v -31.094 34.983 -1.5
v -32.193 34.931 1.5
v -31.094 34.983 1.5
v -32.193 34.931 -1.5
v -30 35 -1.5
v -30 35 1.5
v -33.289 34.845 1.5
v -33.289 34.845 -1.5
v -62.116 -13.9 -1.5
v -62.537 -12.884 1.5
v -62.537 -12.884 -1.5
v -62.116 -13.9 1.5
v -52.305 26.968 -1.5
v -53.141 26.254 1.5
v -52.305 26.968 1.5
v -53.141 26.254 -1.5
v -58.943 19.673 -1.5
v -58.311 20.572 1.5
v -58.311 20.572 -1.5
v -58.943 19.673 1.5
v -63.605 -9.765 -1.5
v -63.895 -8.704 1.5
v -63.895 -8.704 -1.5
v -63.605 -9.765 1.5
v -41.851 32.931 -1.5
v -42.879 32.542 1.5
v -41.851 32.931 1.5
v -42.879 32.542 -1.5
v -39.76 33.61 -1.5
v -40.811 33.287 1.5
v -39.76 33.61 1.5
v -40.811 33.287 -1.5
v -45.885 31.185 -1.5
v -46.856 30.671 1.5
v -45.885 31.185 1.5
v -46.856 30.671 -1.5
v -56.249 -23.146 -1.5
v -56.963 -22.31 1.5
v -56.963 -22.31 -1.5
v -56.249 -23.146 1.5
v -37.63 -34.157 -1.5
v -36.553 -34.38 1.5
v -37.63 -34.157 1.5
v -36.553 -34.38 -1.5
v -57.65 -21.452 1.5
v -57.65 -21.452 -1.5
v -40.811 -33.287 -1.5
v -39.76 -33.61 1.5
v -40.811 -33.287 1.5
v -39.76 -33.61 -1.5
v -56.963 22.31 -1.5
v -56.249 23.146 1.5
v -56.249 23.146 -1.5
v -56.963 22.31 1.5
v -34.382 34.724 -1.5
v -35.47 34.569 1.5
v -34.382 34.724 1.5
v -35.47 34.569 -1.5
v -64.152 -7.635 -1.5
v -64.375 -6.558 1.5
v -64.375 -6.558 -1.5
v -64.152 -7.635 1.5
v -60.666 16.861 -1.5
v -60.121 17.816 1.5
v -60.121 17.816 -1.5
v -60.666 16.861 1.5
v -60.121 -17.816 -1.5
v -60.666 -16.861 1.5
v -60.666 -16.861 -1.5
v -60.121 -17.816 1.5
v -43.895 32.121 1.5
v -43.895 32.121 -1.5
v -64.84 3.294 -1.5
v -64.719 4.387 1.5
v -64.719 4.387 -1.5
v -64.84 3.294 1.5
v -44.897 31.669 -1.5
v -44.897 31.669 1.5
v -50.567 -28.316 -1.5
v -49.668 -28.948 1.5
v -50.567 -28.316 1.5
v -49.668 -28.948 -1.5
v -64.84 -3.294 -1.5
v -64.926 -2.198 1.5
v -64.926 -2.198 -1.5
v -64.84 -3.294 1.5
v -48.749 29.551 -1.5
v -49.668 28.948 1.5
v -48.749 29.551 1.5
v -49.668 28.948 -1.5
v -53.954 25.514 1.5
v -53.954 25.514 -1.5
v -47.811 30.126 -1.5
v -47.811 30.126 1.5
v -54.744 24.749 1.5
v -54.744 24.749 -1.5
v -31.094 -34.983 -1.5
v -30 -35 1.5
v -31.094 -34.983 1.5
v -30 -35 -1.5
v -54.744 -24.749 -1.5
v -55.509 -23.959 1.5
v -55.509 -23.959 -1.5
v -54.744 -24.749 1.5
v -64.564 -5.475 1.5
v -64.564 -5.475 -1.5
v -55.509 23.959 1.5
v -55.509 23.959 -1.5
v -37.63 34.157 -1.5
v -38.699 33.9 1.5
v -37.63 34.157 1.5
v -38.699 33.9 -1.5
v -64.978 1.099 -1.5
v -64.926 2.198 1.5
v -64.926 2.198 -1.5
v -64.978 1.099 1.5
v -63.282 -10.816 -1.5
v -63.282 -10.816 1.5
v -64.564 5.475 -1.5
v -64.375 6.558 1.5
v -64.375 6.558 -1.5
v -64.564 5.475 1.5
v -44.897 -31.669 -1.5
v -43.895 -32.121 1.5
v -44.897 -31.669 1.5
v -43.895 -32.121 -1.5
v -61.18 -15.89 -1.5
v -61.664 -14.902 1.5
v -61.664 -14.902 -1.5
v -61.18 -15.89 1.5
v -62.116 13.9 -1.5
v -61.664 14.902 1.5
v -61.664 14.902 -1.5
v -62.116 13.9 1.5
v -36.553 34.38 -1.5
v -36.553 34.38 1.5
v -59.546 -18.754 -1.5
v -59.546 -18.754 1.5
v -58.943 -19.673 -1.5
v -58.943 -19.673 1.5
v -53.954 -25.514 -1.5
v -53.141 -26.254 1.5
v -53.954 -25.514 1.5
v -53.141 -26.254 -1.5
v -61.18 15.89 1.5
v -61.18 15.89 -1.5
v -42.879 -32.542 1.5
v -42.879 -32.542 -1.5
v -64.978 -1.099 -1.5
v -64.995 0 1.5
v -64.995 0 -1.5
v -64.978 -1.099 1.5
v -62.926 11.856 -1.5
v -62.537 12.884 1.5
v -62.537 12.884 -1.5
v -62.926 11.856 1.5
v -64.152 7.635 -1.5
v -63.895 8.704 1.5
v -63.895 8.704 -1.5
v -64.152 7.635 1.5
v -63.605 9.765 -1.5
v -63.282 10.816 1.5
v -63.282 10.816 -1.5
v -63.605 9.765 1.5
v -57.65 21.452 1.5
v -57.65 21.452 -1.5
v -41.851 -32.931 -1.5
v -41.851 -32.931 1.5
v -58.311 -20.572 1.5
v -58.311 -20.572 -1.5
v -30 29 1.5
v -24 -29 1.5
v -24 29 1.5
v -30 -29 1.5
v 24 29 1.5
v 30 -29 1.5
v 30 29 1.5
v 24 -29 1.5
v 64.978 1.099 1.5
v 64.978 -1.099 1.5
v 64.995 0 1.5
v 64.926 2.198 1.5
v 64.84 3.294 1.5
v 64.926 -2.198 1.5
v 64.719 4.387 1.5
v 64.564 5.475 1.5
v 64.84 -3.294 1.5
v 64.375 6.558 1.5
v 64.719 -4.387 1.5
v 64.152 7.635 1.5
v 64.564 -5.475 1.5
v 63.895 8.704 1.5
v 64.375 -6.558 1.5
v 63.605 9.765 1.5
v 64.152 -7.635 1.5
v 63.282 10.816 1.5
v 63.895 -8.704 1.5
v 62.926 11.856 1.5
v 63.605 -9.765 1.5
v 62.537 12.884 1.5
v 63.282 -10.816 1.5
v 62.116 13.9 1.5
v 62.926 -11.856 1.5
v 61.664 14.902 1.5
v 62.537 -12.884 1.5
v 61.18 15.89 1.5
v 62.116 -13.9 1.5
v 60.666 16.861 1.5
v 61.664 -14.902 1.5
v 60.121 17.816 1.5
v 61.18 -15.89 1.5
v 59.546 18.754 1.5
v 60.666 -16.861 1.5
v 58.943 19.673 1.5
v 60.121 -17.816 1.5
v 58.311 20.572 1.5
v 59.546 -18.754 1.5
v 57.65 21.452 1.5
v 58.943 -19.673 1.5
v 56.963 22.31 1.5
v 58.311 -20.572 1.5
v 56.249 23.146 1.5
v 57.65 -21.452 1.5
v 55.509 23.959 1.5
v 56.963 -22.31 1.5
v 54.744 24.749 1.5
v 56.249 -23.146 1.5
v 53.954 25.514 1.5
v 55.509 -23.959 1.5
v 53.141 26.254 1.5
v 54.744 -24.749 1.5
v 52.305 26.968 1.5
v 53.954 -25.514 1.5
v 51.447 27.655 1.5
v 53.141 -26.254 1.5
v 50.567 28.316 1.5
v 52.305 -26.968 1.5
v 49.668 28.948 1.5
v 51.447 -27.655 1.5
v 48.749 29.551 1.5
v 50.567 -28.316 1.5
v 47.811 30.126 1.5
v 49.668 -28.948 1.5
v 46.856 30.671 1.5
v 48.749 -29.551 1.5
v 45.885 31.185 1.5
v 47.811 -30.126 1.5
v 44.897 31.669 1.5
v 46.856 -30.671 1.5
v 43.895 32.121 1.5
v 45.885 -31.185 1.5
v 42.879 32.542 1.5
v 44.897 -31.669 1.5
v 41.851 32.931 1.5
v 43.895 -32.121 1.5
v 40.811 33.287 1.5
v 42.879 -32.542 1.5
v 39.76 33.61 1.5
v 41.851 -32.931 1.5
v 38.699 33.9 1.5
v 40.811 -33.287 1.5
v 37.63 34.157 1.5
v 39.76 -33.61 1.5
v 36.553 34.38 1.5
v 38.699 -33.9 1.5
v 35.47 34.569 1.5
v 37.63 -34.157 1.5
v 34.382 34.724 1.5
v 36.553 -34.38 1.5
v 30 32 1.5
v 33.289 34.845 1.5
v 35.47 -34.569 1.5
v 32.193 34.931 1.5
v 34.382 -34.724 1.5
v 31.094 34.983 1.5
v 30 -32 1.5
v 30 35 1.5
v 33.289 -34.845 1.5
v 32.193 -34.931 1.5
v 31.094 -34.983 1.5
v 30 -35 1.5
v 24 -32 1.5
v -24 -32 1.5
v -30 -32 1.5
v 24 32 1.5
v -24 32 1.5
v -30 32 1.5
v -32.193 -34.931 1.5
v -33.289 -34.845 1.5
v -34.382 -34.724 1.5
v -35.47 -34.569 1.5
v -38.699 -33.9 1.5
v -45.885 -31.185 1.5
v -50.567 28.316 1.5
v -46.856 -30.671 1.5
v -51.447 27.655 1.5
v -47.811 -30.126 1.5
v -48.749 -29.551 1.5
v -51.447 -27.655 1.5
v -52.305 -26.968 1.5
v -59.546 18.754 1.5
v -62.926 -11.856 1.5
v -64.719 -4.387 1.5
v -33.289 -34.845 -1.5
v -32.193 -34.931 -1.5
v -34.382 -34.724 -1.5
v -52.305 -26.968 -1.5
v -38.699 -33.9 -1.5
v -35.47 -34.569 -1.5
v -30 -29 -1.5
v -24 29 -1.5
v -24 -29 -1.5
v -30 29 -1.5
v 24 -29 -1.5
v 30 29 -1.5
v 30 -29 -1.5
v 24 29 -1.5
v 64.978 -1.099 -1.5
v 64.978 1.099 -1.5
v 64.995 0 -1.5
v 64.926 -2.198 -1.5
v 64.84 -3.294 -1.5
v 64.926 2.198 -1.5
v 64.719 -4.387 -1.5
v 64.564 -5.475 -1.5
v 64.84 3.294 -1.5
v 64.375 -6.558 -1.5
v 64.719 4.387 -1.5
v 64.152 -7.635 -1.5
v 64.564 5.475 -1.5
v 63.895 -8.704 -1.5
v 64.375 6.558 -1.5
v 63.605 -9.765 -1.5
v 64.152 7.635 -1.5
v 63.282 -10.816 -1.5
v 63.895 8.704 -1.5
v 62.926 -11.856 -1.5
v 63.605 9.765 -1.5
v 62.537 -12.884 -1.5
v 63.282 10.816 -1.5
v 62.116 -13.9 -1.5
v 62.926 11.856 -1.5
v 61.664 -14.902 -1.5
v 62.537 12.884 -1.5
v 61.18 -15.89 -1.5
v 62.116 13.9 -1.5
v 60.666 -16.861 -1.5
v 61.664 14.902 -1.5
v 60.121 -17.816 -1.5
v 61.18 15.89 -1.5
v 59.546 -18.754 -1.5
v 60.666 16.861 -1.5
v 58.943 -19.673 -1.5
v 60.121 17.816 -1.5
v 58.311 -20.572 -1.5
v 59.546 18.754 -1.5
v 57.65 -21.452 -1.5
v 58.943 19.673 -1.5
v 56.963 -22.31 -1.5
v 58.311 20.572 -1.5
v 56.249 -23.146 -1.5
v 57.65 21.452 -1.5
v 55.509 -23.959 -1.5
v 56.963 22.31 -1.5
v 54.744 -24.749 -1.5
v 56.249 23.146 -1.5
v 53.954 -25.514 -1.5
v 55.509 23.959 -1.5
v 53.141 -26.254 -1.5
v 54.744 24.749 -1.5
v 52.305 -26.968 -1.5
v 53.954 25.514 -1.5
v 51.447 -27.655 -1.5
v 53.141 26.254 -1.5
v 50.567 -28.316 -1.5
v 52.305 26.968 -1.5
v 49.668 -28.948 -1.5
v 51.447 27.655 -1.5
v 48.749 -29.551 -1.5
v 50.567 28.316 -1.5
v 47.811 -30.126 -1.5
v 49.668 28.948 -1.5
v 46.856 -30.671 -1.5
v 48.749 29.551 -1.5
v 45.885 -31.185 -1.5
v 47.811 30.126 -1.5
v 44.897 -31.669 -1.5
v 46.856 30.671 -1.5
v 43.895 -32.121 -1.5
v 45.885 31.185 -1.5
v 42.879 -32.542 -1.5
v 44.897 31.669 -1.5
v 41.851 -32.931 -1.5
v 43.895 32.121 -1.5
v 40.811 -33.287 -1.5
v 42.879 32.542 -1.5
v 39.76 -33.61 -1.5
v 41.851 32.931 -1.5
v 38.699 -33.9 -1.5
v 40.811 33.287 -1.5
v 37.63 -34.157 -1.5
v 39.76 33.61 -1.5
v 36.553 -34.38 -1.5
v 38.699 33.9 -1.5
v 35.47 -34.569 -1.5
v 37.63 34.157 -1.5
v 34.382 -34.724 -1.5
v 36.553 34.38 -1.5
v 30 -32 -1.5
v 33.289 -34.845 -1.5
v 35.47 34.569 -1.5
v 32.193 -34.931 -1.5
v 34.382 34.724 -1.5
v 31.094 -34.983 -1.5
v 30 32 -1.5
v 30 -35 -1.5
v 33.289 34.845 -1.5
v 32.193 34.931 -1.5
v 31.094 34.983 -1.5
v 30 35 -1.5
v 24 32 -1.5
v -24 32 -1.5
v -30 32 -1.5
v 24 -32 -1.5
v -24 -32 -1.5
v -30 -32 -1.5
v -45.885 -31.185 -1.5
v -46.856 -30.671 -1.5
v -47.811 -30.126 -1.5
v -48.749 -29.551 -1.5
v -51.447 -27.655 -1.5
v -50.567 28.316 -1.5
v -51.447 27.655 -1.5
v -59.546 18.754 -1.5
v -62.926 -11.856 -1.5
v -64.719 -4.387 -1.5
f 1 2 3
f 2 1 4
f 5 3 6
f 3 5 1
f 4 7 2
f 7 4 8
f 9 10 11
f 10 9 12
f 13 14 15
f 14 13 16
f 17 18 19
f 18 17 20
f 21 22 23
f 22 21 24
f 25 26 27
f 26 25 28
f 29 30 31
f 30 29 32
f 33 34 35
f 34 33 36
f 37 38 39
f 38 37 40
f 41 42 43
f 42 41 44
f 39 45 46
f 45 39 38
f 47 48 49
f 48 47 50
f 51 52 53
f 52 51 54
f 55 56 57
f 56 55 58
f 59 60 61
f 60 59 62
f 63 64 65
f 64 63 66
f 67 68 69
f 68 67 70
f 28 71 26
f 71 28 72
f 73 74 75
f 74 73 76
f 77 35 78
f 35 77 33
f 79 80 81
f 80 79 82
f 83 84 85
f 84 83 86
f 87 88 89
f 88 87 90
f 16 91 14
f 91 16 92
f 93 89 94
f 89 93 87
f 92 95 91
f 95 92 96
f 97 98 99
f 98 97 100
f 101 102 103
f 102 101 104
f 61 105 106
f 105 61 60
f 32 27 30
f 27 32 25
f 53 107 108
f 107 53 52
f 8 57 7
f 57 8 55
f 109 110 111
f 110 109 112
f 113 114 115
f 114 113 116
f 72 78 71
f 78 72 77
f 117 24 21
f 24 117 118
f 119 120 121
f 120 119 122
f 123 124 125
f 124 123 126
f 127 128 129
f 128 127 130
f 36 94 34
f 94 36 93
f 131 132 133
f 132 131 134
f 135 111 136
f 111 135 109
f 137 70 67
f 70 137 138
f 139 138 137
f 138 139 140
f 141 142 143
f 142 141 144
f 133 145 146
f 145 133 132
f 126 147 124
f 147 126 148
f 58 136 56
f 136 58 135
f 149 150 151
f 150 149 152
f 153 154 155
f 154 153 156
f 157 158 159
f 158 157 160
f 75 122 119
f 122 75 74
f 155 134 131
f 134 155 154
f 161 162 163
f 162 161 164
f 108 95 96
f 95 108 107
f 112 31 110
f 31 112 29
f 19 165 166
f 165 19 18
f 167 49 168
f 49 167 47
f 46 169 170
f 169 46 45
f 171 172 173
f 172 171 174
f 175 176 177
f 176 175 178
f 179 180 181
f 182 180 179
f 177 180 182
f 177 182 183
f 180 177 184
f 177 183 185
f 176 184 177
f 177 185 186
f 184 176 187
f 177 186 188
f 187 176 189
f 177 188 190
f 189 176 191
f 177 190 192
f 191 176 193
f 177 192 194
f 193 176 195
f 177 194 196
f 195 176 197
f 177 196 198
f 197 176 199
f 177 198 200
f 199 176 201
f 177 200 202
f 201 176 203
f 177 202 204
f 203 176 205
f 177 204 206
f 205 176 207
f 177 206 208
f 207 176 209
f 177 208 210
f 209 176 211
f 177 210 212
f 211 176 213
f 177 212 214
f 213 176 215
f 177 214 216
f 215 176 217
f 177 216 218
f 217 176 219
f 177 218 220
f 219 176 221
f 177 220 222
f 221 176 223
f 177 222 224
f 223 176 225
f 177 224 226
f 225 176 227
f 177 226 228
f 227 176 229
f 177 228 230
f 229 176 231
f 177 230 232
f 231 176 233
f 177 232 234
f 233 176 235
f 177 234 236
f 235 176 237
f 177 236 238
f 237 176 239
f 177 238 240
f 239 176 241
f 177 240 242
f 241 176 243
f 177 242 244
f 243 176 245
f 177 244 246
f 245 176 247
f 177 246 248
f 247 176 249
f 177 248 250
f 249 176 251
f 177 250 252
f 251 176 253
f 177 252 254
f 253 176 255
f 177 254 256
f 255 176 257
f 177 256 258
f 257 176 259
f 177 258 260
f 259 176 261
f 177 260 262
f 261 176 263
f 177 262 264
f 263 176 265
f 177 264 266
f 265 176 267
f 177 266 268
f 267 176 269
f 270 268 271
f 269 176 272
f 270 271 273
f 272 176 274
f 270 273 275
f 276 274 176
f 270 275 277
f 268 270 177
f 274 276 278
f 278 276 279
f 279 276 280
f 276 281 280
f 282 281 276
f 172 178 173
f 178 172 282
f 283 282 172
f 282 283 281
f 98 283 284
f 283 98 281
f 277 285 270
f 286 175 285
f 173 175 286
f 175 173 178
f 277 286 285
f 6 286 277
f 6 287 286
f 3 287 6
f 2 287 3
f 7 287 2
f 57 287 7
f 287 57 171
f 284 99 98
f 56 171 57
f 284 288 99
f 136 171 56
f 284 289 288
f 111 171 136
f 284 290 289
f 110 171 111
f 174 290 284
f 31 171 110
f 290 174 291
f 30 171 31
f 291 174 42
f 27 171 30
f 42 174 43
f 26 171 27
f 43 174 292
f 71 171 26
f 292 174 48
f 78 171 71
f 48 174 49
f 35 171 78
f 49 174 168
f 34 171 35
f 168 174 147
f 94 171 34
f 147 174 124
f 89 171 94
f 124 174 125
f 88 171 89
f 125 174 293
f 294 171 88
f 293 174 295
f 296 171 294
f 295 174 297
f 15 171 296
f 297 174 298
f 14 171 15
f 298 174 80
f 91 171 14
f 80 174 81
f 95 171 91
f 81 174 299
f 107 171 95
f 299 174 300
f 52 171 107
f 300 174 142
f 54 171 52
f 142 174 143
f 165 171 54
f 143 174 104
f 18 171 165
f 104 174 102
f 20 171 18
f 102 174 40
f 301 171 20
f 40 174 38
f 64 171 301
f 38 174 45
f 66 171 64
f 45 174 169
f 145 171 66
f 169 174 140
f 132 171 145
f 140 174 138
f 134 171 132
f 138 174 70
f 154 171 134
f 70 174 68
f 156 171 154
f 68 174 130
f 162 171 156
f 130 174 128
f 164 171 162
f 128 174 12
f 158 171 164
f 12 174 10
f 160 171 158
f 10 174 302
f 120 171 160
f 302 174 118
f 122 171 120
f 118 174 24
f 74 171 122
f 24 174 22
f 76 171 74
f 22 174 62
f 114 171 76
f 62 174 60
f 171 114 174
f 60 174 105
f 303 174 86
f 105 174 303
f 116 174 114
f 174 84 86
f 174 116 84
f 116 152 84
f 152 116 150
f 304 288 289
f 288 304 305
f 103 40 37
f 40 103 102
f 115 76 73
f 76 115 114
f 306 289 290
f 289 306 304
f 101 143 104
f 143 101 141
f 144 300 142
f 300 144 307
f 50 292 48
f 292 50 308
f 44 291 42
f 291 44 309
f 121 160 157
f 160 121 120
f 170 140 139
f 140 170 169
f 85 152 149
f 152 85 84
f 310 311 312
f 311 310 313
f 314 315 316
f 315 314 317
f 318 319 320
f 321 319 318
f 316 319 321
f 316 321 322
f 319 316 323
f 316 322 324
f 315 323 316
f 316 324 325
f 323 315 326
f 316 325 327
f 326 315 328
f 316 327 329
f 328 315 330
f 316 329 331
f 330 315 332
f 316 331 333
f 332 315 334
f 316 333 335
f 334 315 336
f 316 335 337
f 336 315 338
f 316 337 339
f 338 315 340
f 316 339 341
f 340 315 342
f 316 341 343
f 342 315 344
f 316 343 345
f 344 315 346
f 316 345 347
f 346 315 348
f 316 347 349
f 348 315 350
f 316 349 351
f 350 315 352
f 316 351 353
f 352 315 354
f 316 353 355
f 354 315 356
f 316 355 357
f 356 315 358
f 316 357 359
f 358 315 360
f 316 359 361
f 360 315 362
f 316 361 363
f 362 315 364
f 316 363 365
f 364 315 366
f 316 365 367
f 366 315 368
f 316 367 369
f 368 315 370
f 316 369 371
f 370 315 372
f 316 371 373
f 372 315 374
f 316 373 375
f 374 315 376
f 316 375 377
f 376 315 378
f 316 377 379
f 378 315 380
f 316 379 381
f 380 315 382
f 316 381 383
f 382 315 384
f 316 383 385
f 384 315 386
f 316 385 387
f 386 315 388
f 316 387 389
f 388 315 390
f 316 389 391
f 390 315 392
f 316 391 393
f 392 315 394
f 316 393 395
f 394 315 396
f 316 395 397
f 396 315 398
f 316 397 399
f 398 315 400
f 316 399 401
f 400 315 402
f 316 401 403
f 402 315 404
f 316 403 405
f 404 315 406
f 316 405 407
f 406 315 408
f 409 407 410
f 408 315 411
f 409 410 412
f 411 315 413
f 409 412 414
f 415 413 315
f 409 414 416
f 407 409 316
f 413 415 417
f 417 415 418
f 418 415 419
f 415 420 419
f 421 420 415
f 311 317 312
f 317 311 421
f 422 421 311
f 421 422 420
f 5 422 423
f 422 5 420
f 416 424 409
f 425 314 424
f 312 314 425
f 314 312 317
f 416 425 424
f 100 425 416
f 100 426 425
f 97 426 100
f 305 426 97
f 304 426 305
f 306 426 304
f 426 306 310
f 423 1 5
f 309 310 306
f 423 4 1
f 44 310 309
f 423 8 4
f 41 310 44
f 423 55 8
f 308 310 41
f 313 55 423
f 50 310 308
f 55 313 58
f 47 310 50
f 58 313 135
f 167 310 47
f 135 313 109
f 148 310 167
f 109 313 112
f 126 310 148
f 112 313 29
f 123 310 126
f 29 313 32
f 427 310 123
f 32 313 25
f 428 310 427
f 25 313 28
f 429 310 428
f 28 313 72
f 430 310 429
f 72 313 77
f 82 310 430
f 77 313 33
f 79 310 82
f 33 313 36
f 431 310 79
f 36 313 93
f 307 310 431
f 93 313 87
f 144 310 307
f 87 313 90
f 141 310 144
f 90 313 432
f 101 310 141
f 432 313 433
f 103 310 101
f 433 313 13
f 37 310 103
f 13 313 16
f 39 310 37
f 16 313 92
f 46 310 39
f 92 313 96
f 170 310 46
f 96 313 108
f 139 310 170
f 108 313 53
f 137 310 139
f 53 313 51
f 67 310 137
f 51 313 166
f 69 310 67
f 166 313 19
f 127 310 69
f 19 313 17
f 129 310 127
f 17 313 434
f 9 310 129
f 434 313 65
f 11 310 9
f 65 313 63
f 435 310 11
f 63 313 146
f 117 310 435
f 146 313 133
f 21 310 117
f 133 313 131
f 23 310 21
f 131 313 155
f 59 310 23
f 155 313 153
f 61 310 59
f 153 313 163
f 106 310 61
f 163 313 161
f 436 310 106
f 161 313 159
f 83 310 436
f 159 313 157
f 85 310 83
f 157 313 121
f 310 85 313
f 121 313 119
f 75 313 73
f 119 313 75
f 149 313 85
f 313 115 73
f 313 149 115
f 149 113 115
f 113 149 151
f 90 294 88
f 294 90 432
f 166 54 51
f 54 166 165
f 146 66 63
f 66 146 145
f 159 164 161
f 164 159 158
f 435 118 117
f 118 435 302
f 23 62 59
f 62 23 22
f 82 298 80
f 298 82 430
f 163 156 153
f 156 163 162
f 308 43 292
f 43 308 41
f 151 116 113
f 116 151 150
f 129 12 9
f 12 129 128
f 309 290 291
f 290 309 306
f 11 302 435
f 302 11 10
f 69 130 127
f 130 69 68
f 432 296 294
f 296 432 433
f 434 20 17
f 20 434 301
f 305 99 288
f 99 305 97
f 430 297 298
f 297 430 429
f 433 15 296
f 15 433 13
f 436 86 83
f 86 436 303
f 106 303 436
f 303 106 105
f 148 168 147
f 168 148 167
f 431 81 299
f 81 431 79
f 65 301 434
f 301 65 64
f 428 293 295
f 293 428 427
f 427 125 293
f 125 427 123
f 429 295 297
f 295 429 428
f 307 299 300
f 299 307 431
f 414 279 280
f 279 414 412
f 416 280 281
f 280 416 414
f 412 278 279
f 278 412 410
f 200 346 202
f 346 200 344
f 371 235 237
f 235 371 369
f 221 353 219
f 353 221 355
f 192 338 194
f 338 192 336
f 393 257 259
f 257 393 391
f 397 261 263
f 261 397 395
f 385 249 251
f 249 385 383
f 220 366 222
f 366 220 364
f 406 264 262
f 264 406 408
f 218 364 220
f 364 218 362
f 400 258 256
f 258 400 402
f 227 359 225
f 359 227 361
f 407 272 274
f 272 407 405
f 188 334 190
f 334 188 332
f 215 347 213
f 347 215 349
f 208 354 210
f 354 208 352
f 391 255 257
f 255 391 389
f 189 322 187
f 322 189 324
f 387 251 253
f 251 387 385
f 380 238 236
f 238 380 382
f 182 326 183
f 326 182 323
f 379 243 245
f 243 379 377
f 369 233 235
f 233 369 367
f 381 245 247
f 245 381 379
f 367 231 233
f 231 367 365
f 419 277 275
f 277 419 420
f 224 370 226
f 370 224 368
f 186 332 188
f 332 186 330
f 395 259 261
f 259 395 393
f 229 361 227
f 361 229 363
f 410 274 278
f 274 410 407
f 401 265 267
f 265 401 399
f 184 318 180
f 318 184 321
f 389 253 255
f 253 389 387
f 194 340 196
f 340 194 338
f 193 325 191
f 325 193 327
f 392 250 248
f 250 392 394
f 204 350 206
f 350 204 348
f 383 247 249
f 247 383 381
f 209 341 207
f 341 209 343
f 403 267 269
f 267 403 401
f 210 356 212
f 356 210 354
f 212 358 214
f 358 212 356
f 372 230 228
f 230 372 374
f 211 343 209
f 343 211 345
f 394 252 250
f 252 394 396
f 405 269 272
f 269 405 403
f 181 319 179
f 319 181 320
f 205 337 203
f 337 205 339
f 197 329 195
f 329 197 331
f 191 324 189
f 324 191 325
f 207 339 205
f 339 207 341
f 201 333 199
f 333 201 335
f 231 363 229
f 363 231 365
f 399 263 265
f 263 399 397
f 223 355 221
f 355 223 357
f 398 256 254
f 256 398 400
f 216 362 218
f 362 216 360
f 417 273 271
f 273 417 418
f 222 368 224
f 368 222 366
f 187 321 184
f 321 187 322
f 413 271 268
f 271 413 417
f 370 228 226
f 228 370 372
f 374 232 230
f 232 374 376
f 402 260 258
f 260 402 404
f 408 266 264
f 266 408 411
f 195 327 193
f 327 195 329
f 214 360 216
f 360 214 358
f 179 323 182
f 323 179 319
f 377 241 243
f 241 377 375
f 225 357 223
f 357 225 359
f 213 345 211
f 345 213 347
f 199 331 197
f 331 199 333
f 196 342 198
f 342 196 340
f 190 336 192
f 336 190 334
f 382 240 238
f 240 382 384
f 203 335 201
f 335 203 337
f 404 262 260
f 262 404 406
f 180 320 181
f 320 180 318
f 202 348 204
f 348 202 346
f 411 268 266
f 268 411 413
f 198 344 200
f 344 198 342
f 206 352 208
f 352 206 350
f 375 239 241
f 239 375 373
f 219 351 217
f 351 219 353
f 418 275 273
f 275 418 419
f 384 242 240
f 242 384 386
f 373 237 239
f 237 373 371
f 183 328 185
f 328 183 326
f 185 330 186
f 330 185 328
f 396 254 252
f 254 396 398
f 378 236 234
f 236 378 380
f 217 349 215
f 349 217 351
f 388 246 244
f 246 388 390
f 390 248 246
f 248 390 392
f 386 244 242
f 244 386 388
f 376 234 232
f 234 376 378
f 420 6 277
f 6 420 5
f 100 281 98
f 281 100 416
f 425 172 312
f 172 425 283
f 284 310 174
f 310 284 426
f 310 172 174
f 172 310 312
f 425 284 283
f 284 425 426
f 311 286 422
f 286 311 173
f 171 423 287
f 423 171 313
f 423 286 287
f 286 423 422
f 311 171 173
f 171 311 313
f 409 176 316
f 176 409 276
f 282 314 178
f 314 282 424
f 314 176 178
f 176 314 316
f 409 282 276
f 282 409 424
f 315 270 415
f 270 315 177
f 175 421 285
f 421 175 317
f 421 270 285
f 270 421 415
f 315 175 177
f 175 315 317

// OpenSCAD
// file: measures.scad
/**
 * Pencil box configuration
 * All measures in millimeters
 */

// rendering parameters
$fn = 200;
nothing = 0.005;

// material to cut from
material_x = 350;
material_y = 180;
material_z = 3;

// total size of the box
box_x = 130;
box_y = 70;
box_z = 100;

// measures of the two half circles left and right
curvature_y = box_y;
curvature_x = curvature_y/2;

// measure of rectangle between half circles
rect_x = box_x - 2*curvature_x;
rect_y = box_y;

top_opening_inset = 5.7*material_z;

wall_z = box_z - 2*material_z;

// distance between wall and outer edge
wall_inset = material_z;

curve_radius = box_y/2 - wall_inset - material_z;
curve_length = curve_radius*PI;

// total wall length without anchor
wall_length = 2*rect_x + 2*curve_length;

// nose properties
nose_x = 2*material_z;
nose_z = material_z;

// anchor
anchor_width = 10;
anchor_height = 30;
anchor_length = 20;

// for preview
pillar_count = 20;
pillar_angle = 180 / (pillar_count-1);
pillar_width = 4;

part_spacing = 1;
// main file
include <measures.scad>;

module round_corner()
{
    difference()
    {
        // full cylinder
        cylinder(
            r = curvature_y/2,
            h = material_z,
            center = true
            );

        // subtract nearer half
        translate([
            0,
            -curvature_y/2,
            0
            ])
        cube([
            curvature_x*1.2,
            curvature_x,
            material_z*1.2
            ], center=true);
    }
}

module face_bottom_without_holes()
{
    // rectangle in the middle
    cube([
        rect_x,
        rect_y,
        material_z
        ], center=true);

    // left round corner
    translate([
        -rect_x/2 +nothing,
        0,
        0
        ])
    rotate([
        0,
        0,
        90
        ])
    round_corner();

    // right round corner
    translate([
        +rect_x/2 -nothing,
        0,
        0
        ])
    rotate([
        0,
        0,
        -90
        ])
    round_corner();
}

module face_bottom()
{
    difference()
    {
        face_bottom_without_holes();

        // noses
        for (x=[
            -rect_x/2+nose_x/2,
            +rect_x/2-nose_x/2
            ])
        {
            for (y=[
                -rect_y/2+wall_inset+material_z/2,
                +rect_y/2-wall_inset-material_z/2
                ])
            {
                translate([
                    x,
                    y,
                    0
                    ])
                cube([
                    nose_x,
                    material_z,
                    material_z*1.2
                    ], center=true);
            }
        }
    }
}

face_bottom();
